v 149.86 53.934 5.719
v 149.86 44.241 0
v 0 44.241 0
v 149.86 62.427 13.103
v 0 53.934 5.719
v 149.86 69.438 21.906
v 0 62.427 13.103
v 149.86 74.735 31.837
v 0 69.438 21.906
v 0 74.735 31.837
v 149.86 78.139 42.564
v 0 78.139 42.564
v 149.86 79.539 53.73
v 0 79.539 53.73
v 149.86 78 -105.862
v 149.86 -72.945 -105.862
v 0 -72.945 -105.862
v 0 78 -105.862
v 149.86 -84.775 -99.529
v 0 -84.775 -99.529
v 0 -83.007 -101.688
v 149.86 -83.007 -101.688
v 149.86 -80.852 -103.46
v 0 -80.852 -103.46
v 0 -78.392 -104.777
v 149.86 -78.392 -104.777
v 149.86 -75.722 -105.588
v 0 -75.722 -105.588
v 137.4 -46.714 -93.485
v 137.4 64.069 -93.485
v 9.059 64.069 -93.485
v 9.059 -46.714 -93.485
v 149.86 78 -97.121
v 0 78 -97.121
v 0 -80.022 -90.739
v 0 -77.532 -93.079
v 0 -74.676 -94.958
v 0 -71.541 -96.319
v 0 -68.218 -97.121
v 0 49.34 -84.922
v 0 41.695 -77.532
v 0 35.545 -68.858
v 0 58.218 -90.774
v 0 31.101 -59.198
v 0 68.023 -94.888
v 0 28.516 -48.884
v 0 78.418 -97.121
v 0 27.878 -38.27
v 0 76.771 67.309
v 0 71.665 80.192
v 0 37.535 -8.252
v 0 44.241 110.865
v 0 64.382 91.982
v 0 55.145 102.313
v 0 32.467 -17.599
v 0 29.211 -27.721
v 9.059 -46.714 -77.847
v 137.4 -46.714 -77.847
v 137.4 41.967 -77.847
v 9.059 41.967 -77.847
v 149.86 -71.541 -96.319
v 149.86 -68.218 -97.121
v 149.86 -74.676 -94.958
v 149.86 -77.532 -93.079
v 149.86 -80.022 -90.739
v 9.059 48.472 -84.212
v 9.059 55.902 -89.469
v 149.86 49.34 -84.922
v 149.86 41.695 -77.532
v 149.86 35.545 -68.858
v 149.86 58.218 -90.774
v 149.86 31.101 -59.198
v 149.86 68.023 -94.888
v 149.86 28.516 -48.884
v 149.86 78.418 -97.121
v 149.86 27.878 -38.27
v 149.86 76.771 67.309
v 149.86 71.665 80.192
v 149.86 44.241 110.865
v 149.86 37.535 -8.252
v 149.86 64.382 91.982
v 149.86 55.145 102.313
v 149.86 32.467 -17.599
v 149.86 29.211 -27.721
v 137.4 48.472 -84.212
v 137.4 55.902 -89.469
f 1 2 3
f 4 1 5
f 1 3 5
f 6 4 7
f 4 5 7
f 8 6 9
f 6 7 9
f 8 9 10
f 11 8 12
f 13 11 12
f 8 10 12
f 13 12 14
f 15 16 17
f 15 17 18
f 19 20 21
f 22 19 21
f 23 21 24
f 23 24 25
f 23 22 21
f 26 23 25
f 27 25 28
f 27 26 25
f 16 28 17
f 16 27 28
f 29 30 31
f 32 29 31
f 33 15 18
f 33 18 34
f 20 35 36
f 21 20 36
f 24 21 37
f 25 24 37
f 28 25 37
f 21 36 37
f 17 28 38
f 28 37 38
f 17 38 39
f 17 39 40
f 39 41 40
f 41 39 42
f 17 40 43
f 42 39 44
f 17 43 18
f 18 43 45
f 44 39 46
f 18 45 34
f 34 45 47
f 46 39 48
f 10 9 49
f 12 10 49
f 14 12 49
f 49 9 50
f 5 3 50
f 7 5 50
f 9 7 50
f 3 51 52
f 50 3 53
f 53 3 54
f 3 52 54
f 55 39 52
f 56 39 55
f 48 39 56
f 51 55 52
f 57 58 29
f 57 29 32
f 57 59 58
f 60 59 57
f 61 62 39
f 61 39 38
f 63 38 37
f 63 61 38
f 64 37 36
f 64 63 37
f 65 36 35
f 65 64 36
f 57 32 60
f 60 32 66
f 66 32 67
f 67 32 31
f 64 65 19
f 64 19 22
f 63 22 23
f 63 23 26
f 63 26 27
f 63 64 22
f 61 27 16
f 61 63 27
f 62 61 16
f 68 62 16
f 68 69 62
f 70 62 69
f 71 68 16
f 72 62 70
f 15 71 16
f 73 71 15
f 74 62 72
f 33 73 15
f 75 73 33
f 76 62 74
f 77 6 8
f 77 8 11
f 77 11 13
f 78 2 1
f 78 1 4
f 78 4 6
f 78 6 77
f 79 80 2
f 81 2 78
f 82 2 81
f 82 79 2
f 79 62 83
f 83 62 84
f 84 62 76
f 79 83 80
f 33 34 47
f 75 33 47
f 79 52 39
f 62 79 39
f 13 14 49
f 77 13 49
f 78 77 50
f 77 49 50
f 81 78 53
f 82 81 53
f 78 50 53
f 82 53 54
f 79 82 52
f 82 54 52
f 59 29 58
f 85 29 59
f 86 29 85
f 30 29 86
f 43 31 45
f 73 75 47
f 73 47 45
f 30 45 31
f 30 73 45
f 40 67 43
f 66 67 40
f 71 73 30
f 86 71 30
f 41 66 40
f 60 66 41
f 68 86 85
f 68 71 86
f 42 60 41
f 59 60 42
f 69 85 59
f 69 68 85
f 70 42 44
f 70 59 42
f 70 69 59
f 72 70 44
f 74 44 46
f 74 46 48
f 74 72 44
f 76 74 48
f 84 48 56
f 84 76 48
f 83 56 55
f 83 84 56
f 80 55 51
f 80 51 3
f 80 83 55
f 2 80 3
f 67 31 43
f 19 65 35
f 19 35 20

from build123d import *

# Parameters (mm, degrees)
F1_DEPTH = 149.86
F3_DEPTH = 149.86
F5_DEPTH = 149.86
F7_DEPTH = 149.86
F8_W     = 128.3415369689
F8_H     = 15.6382545829
F9_DEPTH = 124.714


with BuildPart() as f1:
    # F0 (on Right) → F1 (new body)
    with BuildSketch(Plane.YZ):
        with BuildLine():
            Line((44.2407907503, 110.8653195666), (-72.9446343889, -105.8618834673))
            Line((-72.9446343889, -105.8618834673), (39.9045087847, -105.8618834673))
            ThreePointArc((39.9045087847, -105.8618834673), (23.7226648403, -80.0116112868), (12.4027548979, -51.6929198598))
            ThreePointArc((12.4027548979, -51.6929198598), (16.7125207221, -18.6962392489), (44.2407907503, 0))
            ThreePointArc((44.2407907503, 0), (69.4384780949, 21.9062796628), (79.5394011802, 53.7304825436))
            ThreePointArc((79.5394011802, 53.7304825436), (68.2833280218, 86.247719056), (44.2407907503, 110.8653195666))
        make_face()
    extrude(amount=F1_DEPTH)

    # F2 (on face) → F3 (join)
    with BuildSketch(Plane.YZ.offset(149.86)):
        with BuildLine():
            ThreePointArc((-68.2184364909, -97.1210724816), (-74.6761266058, -94.9578371945), (-80.0221942177, -90.738724774))
            Line((-80.0221942177, -90.738724774), (-84.7749029282, -99.5285658693))
            ThreePointArc((-84.7749029282, -99.5285658693), (-79.6540711296, -104.1789354389), (-72.9446343889, -105.8618834673))
            Line((-72.9446343889, -105.8618834673), (-68.2184364909, -97.1210724816))
        make_face()
        with BuildLine():
            ThreePointArc((-50.4522174888, -64.2635481928), (-47.7805051422, -86.9400572359), (-68.2184364909, -97.1210724816))
            Line((-68.2184364909, -97.1210724816), (-72.9446343889, -105.8618834673))
            Line((-72.9446343889, -105.8618834673), (39.9045087847, -105.8618834673))
            ThreePointArc((39.9045087847, -105.8618834673), (23.7226648403, -80.0116112868), (12.4027548979, -51.6929198598))
            ThreePointArc((12.4027548979, -51.6929198598), (16.7125207221, -18.6962392489), (44.2407907503, 0))
            ThreePointArc((44.2407907503, 0), (69.4384780949, 21.9062796628), (79.5394011802, 53.7304825436))
            ThreePointArc((79.5394011802, 53.7304825436), (68.2833280218, 86.247719056), (44.2407907503, 110.8653195666))
            Line((44.2407907503, 110.8653195666), (-50.4522174888, -64.2635481928))
        make_face()
    extrude(amount=-F3_DEPTH)

    # F4 (on face) → F5 (join)
    with BuildSketch(Plane.YZ.offset(149.86)):
        with BuildLine():
            ThreePointArc((12.4027548979, -51.6929198598), (21.3713458152, -75.1942598568), (33.6986931702, -97.1210724816))
            Line((33.6986931702, -97.1210724816), (78.4184666755, -97.1210724816))
            ThreePointArc((78.4184666755, -97.1210724816), (31.1006677255, -59.1983474365), (44.2407907503, 0))
            ThreePointArc((44.2407907503, 0), (16.7125207221, -18.6962392489), (12.4027548979, -51.6929198598))
        make_face()
    extrude(amount=-F5_DEPTH)

    # F6 (on face) → F7 (join)
    with BuildSketch(Plane.YZ.offset(149.86)):
        with BuildLine():
            Line((78.0001431704, -97.1210724816), (33.6986931702, -97.1210724816))
            ThreePointArc((33.6986931702, -97.1210724816), (36.7329195442, -101.5402405334), (39.9045087847, -105.8618834673))
            Line((39.9045087847, -105.8618834673), (78.0001431704, -105.8618834673))
            Line((78.0001431704, -105.8618834673), (78.0001431704, -97.1210724816))
        make_face()
    extrude(amount=-F7_DEPTH)

    # F8 (on face) → F9 (cut)
    with BuildSketch(Plane(origin=(0, 78.0001431704, 0), x_dir=(-1, 0, 0), z_dir=(0, 1, 0))):
        with Locations((-73.2293818146, -85.6656767428)):
            Rectangle(F8_W, F8_H)
    extrude(amount=-F9_DEPTH, mode=Mode.SUBTRACT)


solid = f1.part
